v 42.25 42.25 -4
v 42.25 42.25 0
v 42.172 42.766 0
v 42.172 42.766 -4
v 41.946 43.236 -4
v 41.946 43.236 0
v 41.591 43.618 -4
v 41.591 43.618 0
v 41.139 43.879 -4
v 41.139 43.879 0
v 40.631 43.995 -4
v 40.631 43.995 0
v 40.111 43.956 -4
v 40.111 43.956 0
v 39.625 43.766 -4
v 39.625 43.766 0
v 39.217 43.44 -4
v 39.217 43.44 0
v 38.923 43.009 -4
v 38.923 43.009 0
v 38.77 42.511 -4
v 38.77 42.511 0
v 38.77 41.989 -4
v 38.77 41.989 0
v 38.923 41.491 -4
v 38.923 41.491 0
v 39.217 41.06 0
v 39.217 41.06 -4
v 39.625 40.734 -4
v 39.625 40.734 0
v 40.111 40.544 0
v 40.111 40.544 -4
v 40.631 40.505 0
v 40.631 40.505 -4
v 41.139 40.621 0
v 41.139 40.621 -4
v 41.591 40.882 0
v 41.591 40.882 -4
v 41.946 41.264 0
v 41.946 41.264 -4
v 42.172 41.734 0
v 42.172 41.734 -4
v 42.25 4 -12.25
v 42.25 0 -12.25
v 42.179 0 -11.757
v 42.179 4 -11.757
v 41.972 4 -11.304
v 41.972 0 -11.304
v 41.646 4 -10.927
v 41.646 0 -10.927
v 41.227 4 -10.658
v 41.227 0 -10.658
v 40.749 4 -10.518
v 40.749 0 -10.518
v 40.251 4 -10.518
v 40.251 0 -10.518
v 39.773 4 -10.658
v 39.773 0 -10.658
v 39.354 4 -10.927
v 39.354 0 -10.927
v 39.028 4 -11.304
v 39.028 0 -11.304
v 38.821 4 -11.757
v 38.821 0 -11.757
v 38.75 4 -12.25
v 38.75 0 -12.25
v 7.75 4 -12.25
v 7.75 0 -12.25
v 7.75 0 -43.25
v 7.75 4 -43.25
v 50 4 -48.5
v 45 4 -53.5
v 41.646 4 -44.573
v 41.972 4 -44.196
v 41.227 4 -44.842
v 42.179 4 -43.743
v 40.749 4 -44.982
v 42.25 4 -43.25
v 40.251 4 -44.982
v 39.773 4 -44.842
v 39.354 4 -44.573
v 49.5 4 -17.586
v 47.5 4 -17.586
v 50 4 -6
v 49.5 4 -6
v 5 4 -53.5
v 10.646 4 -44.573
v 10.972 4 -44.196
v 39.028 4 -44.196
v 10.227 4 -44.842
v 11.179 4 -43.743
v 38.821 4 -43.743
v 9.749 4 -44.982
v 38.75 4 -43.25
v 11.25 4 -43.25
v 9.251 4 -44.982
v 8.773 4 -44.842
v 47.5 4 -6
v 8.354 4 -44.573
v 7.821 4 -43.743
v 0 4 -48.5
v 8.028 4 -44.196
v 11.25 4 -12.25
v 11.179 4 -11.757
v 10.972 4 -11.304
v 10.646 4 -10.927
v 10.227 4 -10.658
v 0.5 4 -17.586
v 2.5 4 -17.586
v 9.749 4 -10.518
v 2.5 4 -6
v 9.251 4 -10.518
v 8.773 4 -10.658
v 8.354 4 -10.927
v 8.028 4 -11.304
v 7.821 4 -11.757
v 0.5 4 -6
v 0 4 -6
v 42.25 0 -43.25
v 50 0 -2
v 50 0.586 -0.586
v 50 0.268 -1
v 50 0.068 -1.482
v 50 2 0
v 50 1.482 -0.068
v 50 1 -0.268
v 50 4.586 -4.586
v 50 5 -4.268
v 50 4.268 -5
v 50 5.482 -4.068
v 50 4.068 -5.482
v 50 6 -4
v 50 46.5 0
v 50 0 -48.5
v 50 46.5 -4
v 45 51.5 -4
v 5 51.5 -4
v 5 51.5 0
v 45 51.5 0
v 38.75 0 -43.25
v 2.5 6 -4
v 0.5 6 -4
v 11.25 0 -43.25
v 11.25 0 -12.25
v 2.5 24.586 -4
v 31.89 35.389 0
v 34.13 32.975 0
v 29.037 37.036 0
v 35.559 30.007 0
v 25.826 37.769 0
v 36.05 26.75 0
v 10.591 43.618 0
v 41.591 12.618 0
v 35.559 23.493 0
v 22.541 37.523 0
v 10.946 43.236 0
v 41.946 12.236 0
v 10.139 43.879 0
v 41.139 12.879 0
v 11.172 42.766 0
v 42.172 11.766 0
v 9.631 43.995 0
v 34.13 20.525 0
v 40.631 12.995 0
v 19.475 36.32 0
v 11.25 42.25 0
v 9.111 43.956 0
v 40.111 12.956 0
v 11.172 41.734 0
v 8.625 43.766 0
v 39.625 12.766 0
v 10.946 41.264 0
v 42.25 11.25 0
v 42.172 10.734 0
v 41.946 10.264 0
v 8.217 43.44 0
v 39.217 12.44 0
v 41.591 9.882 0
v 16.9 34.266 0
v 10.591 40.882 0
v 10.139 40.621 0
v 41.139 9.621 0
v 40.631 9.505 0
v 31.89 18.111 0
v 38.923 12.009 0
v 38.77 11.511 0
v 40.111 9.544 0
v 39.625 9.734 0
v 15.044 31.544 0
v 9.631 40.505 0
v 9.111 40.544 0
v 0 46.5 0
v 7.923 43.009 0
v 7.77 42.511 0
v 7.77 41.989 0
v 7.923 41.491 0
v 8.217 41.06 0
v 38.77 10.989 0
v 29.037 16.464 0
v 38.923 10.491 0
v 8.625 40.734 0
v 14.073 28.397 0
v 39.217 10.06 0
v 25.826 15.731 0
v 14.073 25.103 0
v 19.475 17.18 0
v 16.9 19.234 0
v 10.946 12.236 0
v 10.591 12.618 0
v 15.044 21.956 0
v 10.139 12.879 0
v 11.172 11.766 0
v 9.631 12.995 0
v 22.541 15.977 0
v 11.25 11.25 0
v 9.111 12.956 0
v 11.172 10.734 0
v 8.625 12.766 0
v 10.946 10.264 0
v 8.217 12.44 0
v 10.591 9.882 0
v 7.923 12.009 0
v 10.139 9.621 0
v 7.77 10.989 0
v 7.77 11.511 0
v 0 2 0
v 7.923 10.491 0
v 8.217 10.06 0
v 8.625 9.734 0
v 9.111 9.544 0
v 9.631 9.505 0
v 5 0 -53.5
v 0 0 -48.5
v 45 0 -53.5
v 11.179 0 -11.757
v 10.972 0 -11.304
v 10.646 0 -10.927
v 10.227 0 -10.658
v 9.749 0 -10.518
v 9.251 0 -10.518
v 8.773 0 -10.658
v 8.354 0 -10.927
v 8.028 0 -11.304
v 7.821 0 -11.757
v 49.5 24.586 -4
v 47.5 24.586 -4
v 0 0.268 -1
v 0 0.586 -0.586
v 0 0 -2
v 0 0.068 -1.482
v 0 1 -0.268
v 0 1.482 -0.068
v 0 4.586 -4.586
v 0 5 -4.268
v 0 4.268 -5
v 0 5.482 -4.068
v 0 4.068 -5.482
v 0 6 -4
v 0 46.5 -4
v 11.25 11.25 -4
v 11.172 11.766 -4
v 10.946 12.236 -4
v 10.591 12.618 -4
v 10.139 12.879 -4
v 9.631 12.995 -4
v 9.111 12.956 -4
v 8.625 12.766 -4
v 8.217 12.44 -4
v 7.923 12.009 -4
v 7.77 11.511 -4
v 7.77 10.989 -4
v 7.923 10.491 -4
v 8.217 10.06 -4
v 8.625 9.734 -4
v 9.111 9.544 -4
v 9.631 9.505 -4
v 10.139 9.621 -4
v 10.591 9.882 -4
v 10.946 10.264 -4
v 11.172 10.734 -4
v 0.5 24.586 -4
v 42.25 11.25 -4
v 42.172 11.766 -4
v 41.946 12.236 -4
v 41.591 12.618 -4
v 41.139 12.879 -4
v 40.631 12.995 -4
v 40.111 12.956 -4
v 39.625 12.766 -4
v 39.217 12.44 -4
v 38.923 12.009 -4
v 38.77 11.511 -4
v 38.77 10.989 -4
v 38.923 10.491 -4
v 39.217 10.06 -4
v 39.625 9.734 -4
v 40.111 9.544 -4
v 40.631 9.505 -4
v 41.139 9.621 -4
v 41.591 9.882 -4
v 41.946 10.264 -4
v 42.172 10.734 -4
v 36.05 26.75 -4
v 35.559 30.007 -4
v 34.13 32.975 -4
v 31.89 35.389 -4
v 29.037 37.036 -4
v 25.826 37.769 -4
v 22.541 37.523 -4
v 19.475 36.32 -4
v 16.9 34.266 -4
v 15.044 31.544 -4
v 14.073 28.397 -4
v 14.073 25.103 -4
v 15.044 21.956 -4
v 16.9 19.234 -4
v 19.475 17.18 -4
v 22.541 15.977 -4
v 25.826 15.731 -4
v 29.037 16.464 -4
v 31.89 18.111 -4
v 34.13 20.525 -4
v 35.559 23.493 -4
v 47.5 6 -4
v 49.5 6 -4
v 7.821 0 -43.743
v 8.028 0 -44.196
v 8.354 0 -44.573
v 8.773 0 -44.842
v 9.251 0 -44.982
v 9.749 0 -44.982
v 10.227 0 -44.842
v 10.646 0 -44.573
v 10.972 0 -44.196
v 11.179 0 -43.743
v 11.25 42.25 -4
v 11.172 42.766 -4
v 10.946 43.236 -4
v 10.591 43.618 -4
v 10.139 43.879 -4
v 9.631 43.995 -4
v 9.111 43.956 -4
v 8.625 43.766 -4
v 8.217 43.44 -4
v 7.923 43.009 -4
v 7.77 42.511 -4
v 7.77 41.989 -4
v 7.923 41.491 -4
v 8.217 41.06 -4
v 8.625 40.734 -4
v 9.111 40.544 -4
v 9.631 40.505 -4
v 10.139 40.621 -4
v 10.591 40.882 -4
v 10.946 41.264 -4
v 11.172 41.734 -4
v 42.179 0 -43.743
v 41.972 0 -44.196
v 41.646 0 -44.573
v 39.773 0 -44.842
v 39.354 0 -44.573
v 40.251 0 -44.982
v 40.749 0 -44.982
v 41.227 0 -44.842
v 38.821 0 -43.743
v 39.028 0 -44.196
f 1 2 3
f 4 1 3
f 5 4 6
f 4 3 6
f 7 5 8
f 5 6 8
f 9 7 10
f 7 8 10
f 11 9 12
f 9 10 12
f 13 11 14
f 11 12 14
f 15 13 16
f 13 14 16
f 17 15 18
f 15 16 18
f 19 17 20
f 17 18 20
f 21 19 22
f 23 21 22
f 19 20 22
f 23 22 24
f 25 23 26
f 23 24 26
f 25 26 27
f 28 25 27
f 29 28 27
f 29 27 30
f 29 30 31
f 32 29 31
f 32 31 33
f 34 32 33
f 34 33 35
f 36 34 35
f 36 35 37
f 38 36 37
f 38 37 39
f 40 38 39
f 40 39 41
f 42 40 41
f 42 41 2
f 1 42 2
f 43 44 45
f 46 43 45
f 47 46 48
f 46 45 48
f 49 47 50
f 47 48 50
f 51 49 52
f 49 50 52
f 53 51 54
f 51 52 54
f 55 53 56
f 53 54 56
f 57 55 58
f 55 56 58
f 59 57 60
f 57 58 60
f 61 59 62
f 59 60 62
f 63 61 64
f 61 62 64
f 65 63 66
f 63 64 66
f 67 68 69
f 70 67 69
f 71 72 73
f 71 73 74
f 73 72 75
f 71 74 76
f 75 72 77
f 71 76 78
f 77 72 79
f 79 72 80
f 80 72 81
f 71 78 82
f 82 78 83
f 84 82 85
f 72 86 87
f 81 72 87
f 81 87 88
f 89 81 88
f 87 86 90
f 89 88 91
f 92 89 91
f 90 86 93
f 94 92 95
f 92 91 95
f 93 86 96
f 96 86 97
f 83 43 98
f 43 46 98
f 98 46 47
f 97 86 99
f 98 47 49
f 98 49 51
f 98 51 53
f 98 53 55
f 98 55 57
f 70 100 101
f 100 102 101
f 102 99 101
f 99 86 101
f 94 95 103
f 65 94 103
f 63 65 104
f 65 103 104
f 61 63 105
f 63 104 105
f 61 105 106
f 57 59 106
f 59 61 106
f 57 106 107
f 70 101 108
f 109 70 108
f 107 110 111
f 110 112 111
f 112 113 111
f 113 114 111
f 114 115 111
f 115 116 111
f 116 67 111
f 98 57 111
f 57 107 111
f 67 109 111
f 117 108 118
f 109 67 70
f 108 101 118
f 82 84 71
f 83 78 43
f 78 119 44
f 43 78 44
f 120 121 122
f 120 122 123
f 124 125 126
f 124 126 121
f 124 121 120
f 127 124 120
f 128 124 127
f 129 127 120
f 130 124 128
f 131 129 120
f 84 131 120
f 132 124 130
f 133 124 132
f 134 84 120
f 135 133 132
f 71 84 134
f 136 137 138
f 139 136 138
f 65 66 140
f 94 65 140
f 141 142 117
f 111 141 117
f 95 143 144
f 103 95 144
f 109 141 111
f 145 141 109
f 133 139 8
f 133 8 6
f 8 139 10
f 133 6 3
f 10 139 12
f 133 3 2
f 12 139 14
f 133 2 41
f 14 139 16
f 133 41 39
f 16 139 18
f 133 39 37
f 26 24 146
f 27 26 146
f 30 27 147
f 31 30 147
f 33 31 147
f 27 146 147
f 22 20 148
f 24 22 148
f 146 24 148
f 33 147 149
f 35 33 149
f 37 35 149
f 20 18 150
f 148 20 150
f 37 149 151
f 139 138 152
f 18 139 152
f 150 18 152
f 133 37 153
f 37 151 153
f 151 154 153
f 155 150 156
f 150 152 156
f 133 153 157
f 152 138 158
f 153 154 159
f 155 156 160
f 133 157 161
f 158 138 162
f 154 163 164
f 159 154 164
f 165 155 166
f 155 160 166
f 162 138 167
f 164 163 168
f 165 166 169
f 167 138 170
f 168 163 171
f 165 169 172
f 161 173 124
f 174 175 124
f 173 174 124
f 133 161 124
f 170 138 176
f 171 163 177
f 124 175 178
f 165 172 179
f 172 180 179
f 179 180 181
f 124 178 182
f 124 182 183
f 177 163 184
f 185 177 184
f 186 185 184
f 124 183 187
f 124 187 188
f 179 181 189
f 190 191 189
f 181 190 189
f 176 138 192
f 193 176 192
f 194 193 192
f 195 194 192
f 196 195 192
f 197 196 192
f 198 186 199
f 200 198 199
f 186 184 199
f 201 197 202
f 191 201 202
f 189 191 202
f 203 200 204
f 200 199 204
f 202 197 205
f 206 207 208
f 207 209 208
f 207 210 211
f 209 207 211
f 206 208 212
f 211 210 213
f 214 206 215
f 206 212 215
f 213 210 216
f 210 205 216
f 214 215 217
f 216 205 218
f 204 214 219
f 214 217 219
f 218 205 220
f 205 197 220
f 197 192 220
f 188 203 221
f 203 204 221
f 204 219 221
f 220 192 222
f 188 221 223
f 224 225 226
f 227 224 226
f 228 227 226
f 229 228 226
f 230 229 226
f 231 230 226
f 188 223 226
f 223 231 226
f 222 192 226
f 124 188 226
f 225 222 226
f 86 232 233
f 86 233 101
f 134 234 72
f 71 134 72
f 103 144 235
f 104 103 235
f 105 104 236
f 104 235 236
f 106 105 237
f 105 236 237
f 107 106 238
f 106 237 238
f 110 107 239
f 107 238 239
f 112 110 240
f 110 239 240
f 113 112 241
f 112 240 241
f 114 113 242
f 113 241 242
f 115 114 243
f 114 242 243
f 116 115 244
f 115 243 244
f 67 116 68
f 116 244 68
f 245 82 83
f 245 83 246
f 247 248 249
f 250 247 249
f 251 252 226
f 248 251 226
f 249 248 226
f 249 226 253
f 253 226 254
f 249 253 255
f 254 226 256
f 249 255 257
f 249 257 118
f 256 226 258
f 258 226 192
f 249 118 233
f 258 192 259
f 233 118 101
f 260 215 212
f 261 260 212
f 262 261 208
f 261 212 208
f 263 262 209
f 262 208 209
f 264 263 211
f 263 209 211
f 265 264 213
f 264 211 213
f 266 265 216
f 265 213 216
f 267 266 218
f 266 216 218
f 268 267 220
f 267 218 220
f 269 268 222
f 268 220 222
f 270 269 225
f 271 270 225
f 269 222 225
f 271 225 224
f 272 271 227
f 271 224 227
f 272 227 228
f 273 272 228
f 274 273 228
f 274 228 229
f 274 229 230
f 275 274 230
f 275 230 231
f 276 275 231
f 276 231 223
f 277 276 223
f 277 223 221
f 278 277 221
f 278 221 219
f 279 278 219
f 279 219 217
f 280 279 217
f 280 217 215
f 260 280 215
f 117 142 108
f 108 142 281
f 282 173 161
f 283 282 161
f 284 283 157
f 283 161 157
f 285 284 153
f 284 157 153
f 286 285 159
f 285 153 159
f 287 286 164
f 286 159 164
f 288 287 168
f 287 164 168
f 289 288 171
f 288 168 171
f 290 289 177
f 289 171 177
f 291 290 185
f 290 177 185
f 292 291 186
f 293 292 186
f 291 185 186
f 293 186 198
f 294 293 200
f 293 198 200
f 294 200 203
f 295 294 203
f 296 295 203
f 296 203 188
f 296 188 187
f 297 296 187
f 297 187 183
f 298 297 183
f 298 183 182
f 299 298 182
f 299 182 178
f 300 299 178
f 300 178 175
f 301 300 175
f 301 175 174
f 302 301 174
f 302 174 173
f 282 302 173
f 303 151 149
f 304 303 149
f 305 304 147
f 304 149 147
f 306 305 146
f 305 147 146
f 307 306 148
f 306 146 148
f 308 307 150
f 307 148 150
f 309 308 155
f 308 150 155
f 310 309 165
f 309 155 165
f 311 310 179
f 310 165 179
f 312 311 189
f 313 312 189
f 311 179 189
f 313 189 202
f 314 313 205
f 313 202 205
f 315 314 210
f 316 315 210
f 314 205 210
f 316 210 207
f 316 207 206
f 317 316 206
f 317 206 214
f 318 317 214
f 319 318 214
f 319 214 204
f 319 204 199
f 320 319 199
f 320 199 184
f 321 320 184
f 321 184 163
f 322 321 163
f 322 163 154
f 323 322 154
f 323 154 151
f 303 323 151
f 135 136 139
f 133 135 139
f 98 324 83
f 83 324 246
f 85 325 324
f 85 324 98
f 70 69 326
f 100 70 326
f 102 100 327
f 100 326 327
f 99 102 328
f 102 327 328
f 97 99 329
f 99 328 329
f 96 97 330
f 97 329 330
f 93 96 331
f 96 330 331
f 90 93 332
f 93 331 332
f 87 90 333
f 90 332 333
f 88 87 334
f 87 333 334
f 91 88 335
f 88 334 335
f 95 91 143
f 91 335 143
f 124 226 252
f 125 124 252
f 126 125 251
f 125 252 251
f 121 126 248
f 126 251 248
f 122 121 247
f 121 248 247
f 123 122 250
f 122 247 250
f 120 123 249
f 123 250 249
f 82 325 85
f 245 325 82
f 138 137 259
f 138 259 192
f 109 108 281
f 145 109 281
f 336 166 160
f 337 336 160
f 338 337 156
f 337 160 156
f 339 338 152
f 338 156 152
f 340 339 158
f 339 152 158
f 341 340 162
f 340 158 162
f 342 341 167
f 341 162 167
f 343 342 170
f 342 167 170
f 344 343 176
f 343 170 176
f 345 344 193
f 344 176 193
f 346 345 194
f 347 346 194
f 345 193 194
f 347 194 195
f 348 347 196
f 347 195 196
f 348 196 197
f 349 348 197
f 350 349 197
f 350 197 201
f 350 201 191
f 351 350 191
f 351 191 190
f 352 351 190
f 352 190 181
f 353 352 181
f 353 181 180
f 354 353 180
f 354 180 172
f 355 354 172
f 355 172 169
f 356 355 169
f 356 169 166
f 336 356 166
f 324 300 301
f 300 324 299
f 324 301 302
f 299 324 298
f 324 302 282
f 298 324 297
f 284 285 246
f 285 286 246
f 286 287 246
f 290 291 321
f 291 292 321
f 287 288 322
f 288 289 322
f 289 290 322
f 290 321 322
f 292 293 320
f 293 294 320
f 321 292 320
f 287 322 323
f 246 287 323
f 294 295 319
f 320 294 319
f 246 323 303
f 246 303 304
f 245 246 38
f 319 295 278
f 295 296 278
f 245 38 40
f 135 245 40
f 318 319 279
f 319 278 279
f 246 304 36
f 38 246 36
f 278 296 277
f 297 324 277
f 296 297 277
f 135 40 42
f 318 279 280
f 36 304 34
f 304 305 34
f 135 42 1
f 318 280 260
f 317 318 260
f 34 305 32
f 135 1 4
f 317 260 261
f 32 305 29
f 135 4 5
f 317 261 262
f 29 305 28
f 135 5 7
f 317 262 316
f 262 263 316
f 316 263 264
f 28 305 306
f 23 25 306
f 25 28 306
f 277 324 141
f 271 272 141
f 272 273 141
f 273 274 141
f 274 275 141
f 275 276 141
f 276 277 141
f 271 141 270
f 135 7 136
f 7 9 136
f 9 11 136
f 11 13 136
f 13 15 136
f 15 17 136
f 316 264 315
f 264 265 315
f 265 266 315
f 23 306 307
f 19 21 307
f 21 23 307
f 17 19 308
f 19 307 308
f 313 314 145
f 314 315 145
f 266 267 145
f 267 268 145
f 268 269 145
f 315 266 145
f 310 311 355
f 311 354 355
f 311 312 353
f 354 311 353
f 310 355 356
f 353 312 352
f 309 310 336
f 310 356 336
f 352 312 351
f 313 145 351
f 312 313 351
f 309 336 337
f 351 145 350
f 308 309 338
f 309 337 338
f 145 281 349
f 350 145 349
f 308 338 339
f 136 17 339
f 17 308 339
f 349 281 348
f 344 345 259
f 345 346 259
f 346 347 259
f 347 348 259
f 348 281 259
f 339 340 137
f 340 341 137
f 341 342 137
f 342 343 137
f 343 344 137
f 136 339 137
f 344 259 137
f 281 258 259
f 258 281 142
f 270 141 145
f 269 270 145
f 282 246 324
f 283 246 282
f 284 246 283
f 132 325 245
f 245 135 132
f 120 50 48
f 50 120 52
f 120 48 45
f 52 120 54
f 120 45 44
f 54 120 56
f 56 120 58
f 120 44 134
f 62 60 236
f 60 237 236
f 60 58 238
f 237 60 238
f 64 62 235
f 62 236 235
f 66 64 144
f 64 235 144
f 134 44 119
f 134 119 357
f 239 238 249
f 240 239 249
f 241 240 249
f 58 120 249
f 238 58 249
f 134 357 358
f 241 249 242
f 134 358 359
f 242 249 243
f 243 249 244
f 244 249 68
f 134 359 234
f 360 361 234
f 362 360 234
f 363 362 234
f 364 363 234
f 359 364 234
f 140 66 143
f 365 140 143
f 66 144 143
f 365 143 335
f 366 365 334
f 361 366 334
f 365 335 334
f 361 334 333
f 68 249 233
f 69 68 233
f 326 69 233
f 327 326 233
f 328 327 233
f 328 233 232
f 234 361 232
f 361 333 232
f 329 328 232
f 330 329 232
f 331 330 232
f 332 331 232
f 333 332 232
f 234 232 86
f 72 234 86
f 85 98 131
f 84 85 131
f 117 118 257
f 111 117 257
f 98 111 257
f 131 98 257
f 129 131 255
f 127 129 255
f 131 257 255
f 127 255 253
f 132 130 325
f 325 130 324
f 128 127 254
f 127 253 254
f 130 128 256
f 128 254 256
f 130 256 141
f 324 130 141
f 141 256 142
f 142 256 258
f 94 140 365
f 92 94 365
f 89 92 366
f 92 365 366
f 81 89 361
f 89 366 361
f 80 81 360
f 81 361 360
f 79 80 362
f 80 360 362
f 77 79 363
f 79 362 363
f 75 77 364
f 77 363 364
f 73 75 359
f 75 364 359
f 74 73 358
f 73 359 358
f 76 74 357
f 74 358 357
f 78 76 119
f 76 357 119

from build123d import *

# Parameters (mm, degrees)
SALIENTE_EXTRUIR1_DEPTH = 50
CROQUIS2_R              = 11.05
CROQUIS2_R_2            = 1.75
CORTAR_EXTRUIR1_DEPTH   = 90.523739868
CORTAR_EXTRUIR2_DEPTH   = 90.523739868
CHAFL_N1_SIZE           = 5
SALIENTE_EXTRUIR4_DEPTH = 2
SALIENTE_EXTRUIR5_DEPTH = 2


with BuildPart() as part:
    # Croquis1 → Saliente-Extruir1 (new body)
    with BuildSketch(Plane(origin=(0, 0, 0), x_dir=(0, 0, -1), z_dir=(1, 0, 0))):
        with BuildLine():
            Line((2, 0), (53.5, 0))
            Line((53.5, 0), (53.5, 4))
            Line((53.5, 4), (6, 4))
            ThreePointArc((6, 4), (4.585786438, 4.585786438), (4, 6))
            Line((4, 6), (4, 51.5))
            Line((4, 51.5), (0, 51.5))
            Line((0, 51.5), (0, 2))
            ThreePointArc((0, 2), (0.585786438, 0.585786438), (2, 0))
        make_face()
    extrude(amount=SALIENTE_EXTRUIR1_DEPTH)

    # Croquis2 → Cortar-Extruir1 (cut, through all)
    with BuildSketch(Plane.XY):
        with Locations((25, 26.75)):
            Circle(CROQUIS2_R)
        with Locations((9.5, 42.25)):
            Circle(CROQUIS2_R_2)
        with Locations((40.5, 42.25)):
            Circle(CROQUIS2_R_2)
        with Locations((9.5, 11.25)):
            Circle(CROQUIS2_R_2)
        with Locations((40.5, 11.25)):
            Circle(CROQUIS2_R_2)
    extrude(amount=-CORTAR_EXTRUIR1_DEPTH, mode=Mode.SUBTRACT)

    # Croquis3 → Cortar-Extruir2 (cut, through all)
    with BuildSketch(Plane.XZ):
        with BuildLine():
            Line((7.75, -12.25), (7.75, -43.25))
            ThreePointArc((7.75, -43.25), (9.5, -45), (11.25, -43.25))
            Line((11.25, -43.25), (11.25, -12.25))
            ThreePointArc((11.25, -12.25), (9.5, -10.5), (7.75, -12.25))
        make_face()
        with BuildLine():
            Line((38.75, -12.25), (38.75, -43.25))
            ThreePointArc((38.75, -43.25), (40.5, -45), (42.25, -43.25))
            Line((42.25, -43.25), (42.25, -12.25))
            ThreePointArc((42.25, -12.25), (40.5, -10.5), (38.75, -12.25))
        make_face()
    extrude(amount=-CORTAR_EXTRUIR2_DEPTH, mode=Mode.SUBTRACT)

    # Chaflán1
    chafl_n1_edges = [part.edges().sort_by_distance(p)[0] for p in [
        (0, 2, -53.5),
        (50, 51.5, -2),
        (50, 2, -53.5),
        (0, 51.5, -2),
    ]]
    chamfer(chafl_n1_edges, length=CHAFL_N1_SIZE)

    # Croquis6 → Saliente-Extruir4 (add)
    with BuildSketch(Plane(origin=(49.5, 0, 0), x_dir=(0, 0, -1), z_dir=(1, 0, 0))):
        Polygon((4, 24.585786438), (4, 6), (6, 4), (17.585786438, 4), align=None)
    extrude(amount=-SALIENTE_EXTRUIR4_DEPTH)

    # Croquis7 → Saliente-Extruir5 (add)
    with BuildSketch(Plane.ZY.offset(-0.5)):
        Polygon((-17.585786438, 4), (-4, 24.585786438), (-4, 6), (-6, 4), align=None)
    extrude(amount=-SALIENTE_EXTRUIR5_DEPTH)


solid = part.part
